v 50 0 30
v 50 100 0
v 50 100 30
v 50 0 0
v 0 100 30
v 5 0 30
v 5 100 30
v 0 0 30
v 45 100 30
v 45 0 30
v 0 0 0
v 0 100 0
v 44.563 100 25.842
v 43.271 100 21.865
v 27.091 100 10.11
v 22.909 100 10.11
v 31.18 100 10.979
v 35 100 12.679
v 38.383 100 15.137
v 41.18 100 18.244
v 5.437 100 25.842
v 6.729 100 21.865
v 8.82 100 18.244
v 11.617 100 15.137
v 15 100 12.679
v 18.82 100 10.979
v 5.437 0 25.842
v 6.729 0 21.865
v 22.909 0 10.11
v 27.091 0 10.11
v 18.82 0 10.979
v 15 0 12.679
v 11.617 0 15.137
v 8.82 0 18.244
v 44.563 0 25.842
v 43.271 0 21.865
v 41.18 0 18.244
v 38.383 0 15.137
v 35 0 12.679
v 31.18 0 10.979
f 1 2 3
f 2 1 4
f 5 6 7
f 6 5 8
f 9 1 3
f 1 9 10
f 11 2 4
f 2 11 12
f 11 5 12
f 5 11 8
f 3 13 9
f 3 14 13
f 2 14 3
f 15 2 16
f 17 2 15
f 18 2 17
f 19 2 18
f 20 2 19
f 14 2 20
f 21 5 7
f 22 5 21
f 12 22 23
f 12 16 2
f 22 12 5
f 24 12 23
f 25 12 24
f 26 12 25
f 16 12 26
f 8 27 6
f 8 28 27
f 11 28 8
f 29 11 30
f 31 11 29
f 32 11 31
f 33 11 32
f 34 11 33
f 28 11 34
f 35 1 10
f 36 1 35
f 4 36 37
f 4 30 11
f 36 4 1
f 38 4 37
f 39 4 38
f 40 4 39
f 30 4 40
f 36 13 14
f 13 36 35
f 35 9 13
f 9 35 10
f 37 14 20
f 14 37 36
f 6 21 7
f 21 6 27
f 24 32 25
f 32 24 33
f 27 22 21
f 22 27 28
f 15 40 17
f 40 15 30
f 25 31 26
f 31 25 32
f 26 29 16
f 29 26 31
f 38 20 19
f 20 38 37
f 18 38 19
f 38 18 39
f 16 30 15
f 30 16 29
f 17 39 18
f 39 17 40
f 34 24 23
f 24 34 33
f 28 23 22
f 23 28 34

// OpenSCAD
difference(){
color("yellow") cube([50,100,30]);
color("green") translate([25,-0.1,30]) rotate([-90,0,0]) cylinder(h=101,r=20);
}
